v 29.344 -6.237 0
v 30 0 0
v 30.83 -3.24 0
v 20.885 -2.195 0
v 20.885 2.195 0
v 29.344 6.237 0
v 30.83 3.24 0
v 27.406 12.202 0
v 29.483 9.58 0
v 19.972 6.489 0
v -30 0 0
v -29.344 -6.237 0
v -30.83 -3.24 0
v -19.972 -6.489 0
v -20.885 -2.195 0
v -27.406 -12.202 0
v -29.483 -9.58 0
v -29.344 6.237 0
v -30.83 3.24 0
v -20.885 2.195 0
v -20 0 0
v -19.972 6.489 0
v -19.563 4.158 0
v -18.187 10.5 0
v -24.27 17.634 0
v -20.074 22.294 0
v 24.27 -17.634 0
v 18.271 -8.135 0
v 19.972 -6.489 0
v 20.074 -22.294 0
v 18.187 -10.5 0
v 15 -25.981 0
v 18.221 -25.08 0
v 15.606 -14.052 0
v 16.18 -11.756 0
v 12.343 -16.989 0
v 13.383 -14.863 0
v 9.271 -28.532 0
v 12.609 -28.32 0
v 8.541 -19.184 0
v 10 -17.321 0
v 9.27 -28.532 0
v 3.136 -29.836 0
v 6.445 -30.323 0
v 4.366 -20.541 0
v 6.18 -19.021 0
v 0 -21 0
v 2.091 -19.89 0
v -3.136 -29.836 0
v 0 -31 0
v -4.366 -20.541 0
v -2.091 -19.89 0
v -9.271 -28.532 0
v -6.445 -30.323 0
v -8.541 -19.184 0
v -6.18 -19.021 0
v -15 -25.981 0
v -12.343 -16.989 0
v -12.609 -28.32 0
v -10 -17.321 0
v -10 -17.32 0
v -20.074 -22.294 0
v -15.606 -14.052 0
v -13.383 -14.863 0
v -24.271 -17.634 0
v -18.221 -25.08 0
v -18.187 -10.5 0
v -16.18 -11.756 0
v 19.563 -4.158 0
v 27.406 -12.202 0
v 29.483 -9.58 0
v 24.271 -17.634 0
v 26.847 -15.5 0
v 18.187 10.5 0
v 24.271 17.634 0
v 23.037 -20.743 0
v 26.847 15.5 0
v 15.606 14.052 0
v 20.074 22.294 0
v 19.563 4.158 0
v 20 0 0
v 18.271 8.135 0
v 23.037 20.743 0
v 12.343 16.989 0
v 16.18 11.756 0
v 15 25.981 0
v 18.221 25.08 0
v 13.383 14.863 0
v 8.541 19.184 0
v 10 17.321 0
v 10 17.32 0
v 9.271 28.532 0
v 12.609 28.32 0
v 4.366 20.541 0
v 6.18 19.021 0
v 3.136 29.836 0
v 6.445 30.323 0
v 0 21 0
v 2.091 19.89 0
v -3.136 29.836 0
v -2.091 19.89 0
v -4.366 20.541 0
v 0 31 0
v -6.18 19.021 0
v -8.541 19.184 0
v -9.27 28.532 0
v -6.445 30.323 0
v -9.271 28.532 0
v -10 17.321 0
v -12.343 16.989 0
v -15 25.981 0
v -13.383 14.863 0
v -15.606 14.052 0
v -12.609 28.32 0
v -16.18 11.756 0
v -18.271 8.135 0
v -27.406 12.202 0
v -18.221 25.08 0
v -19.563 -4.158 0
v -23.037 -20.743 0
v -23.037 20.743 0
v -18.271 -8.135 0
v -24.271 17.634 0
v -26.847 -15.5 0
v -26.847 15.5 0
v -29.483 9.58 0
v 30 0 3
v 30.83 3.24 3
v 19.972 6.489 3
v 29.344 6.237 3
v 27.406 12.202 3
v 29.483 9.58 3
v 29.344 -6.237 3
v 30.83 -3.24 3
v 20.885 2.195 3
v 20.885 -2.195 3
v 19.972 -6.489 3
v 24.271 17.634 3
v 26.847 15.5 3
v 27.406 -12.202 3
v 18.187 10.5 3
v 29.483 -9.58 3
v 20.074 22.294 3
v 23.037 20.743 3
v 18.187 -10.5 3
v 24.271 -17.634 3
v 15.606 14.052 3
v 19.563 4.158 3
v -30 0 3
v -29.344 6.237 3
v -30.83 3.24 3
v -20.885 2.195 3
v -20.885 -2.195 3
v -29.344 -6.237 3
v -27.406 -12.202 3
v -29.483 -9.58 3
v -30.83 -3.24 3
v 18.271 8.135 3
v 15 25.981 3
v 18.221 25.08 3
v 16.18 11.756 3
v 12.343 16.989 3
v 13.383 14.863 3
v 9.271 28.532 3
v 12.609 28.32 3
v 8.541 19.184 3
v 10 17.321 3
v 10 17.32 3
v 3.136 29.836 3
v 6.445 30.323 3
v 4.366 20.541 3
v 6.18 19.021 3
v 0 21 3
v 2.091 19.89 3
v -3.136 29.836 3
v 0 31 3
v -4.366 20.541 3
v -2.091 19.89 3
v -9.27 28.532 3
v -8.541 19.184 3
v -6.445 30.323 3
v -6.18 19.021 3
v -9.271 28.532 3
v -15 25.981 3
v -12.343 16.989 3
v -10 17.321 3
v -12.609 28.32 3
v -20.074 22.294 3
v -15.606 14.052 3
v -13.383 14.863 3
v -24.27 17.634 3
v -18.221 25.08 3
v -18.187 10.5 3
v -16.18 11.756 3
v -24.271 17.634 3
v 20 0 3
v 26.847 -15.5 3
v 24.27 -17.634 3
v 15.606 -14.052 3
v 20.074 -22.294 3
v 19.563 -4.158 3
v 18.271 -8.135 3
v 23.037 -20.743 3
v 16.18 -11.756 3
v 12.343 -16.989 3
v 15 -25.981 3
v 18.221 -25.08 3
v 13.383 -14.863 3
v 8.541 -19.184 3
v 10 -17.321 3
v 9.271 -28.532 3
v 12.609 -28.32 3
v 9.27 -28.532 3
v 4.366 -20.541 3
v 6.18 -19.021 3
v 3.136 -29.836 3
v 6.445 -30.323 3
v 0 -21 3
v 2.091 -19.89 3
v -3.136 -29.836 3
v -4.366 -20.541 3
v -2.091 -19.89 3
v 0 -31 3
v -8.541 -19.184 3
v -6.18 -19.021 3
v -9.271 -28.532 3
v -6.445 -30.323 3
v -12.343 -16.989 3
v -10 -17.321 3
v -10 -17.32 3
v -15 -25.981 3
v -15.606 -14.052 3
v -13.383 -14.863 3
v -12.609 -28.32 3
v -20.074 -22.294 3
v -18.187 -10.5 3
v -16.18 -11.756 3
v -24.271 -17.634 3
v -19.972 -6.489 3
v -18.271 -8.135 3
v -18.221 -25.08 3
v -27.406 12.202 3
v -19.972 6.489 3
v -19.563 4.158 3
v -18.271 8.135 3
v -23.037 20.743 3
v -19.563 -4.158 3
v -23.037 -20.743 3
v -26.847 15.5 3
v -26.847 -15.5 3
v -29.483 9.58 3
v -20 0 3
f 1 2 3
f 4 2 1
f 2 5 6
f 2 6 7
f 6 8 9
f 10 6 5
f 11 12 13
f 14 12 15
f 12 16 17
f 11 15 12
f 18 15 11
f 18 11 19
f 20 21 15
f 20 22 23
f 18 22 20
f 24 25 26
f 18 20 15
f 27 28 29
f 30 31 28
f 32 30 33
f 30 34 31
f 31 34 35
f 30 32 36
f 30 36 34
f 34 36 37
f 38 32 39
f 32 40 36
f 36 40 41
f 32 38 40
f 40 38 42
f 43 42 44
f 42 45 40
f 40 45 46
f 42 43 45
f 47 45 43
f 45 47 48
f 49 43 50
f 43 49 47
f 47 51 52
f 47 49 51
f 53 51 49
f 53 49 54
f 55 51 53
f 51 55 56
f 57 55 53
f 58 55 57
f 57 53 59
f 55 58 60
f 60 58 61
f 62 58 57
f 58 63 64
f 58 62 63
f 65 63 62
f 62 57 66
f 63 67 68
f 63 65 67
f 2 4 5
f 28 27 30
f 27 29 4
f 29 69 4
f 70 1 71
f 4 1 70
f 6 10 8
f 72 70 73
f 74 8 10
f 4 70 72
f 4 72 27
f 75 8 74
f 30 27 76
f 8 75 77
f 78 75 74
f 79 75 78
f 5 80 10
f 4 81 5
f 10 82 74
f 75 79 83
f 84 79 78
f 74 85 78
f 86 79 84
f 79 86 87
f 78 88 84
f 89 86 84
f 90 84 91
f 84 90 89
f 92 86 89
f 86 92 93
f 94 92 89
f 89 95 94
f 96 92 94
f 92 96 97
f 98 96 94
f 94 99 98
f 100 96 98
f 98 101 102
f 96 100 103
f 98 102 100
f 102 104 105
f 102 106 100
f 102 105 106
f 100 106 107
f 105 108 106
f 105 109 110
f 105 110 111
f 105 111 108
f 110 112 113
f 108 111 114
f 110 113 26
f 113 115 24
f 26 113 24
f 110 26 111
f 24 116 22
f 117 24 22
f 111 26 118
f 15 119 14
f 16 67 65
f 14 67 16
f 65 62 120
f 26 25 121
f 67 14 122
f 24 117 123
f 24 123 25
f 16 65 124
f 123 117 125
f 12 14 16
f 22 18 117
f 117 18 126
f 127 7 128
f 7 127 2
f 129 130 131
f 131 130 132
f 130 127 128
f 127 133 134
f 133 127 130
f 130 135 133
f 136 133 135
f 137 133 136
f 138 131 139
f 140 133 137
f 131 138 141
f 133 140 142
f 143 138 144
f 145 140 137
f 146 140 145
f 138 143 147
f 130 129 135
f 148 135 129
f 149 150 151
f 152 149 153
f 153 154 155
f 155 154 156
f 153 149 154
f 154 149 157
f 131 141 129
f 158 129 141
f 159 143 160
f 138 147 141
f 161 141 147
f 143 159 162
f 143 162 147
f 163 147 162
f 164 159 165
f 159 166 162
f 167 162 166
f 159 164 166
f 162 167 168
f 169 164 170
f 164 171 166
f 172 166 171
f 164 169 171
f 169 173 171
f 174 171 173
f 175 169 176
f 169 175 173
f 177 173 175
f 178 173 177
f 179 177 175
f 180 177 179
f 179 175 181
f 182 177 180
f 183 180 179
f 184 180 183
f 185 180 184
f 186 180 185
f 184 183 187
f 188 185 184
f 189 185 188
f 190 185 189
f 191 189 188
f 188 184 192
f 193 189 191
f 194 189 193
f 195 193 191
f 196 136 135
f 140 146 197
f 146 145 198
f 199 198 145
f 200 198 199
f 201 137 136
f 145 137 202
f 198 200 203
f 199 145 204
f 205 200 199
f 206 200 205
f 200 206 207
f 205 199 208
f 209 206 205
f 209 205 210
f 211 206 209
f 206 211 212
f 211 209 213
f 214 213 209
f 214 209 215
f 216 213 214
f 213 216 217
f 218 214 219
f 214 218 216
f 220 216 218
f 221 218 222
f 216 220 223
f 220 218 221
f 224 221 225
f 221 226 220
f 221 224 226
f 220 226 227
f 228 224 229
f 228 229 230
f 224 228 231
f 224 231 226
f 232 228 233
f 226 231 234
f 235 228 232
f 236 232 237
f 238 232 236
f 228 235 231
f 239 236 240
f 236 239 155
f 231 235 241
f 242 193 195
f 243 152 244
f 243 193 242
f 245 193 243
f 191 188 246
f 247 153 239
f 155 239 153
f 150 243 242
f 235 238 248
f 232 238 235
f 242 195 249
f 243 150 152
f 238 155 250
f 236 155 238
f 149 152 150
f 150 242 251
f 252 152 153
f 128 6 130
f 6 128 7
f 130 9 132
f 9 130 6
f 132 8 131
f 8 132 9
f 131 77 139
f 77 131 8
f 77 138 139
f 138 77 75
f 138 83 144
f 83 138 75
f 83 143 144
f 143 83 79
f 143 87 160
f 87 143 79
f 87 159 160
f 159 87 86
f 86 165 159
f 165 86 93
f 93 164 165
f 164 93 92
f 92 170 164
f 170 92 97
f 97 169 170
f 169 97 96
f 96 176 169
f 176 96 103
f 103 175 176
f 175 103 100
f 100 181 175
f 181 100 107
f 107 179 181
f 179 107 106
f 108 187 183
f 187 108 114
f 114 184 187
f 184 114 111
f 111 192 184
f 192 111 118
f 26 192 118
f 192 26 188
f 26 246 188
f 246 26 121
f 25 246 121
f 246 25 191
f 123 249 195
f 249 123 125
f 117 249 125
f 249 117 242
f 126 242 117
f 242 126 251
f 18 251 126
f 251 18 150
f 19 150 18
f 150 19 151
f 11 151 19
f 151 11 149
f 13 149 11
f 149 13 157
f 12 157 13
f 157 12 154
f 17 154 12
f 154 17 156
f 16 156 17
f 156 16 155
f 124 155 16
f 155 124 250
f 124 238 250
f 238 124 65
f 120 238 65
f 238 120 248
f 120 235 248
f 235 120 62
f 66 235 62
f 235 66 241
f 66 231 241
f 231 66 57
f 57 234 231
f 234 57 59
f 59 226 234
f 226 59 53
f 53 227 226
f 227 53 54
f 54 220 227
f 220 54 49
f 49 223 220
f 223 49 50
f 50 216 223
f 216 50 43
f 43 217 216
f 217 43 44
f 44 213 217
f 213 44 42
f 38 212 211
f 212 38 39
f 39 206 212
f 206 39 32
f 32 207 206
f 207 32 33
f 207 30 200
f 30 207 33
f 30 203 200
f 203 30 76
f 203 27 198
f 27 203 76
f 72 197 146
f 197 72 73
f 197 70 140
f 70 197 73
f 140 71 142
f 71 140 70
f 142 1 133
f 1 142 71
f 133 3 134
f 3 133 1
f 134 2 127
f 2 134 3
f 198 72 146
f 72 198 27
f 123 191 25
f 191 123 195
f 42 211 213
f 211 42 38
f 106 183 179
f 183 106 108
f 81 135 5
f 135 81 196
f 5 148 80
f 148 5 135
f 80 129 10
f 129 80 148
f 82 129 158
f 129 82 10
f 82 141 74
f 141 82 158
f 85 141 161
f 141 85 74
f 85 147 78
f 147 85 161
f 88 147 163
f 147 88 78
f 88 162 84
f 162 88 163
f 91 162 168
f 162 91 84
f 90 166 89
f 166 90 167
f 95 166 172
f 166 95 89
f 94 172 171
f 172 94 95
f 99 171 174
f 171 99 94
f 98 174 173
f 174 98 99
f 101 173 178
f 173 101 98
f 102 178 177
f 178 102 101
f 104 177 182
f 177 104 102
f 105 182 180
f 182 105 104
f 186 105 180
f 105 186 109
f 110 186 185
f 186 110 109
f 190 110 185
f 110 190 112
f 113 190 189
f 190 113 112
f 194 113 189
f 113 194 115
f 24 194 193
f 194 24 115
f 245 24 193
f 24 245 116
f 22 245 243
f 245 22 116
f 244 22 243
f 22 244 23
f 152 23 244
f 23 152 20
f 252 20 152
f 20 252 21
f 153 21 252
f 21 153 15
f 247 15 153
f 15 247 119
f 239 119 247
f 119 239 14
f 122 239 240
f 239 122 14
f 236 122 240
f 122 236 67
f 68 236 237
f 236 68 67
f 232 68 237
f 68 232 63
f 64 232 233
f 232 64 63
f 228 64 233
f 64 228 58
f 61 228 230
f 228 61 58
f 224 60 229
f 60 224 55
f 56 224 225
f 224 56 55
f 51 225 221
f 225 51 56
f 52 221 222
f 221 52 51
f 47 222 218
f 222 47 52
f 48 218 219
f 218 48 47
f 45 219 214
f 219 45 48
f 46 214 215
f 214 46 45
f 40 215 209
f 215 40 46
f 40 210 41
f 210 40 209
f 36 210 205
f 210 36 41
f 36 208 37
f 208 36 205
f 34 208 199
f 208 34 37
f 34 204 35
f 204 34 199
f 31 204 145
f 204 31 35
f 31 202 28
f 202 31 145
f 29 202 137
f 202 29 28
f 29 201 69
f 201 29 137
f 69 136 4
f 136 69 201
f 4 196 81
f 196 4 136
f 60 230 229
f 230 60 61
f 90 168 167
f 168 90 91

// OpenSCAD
module gear(height, radius, teeth_depth, teeth=30) {
	cylinder(h=height, r=radius, $fn=teeth);
	for(tooth = [0 : teeth]) {
		rotate([0, 0, tooth * 360 / teeth]) {
			linear_extrude(height=height) {
				polygon(points=[[radius, 0], [cos(360 / teeth) * radius, sin(360 / teeth) * radius], [cos(180 / teeth) * (radius + teeth_depth), sin(180 / teeth) * (radius + teeth_depth)]], convexity=1);
			}
		}
	}
}

difference() {
	gear(3, 30, 1);
	gear(3, 20, 1);
}
